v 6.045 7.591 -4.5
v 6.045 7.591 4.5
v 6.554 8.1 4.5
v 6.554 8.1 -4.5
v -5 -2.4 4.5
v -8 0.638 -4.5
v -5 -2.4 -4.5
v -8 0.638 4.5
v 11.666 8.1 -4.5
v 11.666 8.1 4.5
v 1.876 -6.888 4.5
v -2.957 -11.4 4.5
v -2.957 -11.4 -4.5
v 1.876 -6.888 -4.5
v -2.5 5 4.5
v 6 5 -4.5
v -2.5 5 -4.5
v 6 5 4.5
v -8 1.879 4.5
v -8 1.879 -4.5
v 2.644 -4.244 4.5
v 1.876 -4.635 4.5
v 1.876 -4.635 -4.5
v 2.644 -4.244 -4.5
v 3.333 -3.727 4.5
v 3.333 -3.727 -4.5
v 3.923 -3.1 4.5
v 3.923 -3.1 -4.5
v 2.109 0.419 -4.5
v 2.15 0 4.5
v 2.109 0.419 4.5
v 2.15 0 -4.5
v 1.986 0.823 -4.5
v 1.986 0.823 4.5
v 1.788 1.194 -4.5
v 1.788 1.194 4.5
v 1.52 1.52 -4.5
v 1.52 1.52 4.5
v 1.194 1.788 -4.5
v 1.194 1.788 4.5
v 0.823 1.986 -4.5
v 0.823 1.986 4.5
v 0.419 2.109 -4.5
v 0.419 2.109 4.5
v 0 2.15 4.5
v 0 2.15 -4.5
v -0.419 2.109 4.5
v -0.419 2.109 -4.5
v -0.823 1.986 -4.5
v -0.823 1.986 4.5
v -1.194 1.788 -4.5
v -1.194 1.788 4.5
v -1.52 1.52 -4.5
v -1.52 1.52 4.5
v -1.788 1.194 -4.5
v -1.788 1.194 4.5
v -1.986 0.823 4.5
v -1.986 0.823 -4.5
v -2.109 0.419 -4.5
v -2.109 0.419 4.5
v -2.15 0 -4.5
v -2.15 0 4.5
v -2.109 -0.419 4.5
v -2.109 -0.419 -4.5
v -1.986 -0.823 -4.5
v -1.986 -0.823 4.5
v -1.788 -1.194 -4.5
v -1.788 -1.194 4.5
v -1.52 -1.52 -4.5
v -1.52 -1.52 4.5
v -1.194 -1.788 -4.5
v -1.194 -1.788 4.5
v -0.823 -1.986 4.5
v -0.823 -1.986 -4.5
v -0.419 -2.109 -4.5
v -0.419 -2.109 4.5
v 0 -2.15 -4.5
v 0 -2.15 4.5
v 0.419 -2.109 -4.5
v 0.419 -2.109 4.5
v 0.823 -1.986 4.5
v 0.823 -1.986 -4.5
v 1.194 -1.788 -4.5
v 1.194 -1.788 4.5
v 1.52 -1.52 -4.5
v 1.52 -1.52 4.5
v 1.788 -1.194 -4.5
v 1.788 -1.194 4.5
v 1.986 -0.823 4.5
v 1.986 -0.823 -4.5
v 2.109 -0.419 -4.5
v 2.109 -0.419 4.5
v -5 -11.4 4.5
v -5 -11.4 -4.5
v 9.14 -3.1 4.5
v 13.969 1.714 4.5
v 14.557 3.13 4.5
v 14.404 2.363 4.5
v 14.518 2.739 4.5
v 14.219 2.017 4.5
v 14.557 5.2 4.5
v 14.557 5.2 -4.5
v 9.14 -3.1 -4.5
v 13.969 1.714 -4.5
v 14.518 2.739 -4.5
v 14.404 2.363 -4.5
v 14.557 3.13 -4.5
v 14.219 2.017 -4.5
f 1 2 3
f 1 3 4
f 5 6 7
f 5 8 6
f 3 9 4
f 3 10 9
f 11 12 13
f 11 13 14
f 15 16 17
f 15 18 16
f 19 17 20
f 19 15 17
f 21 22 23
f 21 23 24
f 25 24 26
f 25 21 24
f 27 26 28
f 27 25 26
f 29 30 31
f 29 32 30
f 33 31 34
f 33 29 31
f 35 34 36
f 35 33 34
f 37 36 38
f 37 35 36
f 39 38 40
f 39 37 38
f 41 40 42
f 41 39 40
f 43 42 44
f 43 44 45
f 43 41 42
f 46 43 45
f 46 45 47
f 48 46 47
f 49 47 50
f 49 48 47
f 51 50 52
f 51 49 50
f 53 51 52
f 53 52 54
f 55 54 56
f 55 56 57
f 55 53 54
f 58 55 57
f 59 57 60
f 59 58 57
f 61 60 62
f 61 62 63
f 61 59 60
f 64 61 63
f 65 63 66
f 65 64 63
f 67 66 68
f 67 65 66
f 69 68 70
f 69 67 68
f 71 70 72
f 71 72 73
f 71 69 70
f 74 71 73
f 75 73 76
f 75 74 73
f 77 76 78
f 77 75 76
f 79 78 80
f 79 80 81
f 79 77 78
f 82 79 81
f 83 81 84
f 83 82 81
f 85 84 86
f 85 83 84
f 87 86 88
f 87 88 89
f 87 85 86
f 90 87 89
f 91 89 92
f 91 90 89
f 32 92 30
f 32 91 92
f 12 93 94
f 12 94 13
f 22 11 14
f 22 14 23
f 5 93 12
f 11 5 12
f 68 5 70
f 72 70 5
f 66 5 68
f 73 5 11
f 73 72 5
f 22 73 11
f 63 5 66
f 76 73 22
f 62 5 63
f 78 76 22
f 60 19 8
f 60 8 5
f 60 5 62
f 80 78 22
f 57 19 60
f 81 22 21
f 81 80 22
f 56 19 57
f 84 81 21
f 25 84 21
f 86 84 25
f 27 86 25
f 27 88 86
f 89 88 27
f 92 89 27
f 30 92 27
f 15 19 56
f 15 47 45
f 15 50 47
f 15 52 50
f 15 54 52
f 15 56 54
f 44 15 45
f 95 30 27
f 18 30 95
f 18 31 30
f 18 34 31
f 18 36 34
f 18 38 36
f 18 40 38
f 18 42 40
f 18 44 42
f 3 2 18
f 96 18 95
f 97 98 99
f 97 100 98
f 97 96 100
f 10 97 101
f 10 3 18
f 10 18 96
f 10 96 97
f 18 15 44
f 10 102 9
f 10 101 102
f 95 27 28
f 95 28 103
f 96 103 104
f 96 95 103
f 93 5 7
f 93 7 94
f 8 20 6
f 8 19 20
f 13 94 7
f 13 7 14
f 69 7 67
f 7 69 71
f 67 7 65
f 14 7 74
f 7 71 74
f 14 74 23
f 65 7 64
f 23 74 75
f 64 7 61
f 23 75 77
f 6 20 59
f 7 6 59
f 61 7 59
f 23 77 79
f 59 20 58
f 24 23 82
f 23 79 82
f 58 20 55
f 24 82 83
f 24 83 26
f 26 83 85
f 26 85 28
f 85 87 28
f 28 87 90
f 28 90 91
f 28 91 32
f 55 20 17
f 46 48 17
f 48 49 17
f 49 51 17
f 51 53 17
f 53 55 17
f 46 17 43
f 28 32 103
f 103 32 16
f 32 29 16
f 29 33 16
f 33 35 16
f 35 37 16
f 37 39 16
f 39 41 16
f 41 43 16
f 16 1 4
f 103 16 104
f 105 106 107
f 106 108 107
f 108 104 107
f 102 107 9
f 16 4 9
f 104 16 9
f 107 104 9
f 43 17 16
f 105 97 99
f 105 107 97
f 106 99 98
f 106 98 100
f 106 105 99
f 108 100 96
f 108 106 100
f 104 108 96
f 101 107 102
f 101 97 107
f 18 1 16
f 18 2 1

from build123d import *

# Parameters (mm, degrees)
SKETCH_1_R      = 2.15
EXTRUDE_1_DEPTH = 4.5
FILLET_1_R      = 2
CHAMFER_1_SIZE  = 0.5
CHAMFER_1_SIZE2 = 0.508960096


with BuildPart() as part:
    # 스케치1 → 보스-돌출1 (new, symmetric)
    with BuildSketch(Plane.XY):
        with BuildLine():
            Line((-8, 0.638251315), (-5, -2.4))
            Line((-5, -2.4), (-5, -11.4))
            Line((-5, -11.4), (-2.956819065, -11.4))
            Line((-2.956819065, -11.4), (1.87605446, -6.887535593))
            Line((1.87605446, -6.887535593), (1.87605446, -4.634697365))
            ThreePointArc((1.87605446, -4.634697365), (2.999351329, -4.000486421), (3.923009049, -3.1))
            Line((3.923009049, -3.1), (9.140101739, -3.1))
            Line((9.140101739, -3.1), (14.557074242, 2.3))
            Line((14.557074242, 2.3), (14.557074242, 5.2))
            Line((14.557074242, 5.2), (11.666160546, 8.1))
            Line((11.666160546, 8.1), (6.054110701, 8.1))
            Line((6.054110701, 8.1), (6, 5))
            Line((6, 5), (-2.5, 5))
            Line((-2.5, 5), (-8, 1.878902403))
            Line((-8, 1.878902403), (-8, 0.638251315))
        make_face()
        Circle(SKETCH_1_R, mode=Mode.SUBTRACT)
    extrude(amount=EXTRUDE_1_DEPTH, both=True)

    # 필렛1
    fillet_1_edges = [part.edges().sort_by_distance(p)[0] for p in [
        (14.557074242, 2.3, 0),
    ]]
    fillet(fillet_1_edges, radius=FILLET_1_R)

    # 모따기1
    chamfer_1_edges = [part.edges().sort_by_distance(p)[0] for p in [
        (6.054110701, 8.1, 0),
    ]]
    chamfer_1_side = [part.faces().sort_by_distance(p)[0] for p in [
        (8.860135624, 8.1, 0),
    ]]
    chamfer(chamfer_1_edges, length=CHAMFER_1_SIZE, length2=CHAMFER_1_SIZE2, reference=chamfer_1_side[0])


solid = part.part
